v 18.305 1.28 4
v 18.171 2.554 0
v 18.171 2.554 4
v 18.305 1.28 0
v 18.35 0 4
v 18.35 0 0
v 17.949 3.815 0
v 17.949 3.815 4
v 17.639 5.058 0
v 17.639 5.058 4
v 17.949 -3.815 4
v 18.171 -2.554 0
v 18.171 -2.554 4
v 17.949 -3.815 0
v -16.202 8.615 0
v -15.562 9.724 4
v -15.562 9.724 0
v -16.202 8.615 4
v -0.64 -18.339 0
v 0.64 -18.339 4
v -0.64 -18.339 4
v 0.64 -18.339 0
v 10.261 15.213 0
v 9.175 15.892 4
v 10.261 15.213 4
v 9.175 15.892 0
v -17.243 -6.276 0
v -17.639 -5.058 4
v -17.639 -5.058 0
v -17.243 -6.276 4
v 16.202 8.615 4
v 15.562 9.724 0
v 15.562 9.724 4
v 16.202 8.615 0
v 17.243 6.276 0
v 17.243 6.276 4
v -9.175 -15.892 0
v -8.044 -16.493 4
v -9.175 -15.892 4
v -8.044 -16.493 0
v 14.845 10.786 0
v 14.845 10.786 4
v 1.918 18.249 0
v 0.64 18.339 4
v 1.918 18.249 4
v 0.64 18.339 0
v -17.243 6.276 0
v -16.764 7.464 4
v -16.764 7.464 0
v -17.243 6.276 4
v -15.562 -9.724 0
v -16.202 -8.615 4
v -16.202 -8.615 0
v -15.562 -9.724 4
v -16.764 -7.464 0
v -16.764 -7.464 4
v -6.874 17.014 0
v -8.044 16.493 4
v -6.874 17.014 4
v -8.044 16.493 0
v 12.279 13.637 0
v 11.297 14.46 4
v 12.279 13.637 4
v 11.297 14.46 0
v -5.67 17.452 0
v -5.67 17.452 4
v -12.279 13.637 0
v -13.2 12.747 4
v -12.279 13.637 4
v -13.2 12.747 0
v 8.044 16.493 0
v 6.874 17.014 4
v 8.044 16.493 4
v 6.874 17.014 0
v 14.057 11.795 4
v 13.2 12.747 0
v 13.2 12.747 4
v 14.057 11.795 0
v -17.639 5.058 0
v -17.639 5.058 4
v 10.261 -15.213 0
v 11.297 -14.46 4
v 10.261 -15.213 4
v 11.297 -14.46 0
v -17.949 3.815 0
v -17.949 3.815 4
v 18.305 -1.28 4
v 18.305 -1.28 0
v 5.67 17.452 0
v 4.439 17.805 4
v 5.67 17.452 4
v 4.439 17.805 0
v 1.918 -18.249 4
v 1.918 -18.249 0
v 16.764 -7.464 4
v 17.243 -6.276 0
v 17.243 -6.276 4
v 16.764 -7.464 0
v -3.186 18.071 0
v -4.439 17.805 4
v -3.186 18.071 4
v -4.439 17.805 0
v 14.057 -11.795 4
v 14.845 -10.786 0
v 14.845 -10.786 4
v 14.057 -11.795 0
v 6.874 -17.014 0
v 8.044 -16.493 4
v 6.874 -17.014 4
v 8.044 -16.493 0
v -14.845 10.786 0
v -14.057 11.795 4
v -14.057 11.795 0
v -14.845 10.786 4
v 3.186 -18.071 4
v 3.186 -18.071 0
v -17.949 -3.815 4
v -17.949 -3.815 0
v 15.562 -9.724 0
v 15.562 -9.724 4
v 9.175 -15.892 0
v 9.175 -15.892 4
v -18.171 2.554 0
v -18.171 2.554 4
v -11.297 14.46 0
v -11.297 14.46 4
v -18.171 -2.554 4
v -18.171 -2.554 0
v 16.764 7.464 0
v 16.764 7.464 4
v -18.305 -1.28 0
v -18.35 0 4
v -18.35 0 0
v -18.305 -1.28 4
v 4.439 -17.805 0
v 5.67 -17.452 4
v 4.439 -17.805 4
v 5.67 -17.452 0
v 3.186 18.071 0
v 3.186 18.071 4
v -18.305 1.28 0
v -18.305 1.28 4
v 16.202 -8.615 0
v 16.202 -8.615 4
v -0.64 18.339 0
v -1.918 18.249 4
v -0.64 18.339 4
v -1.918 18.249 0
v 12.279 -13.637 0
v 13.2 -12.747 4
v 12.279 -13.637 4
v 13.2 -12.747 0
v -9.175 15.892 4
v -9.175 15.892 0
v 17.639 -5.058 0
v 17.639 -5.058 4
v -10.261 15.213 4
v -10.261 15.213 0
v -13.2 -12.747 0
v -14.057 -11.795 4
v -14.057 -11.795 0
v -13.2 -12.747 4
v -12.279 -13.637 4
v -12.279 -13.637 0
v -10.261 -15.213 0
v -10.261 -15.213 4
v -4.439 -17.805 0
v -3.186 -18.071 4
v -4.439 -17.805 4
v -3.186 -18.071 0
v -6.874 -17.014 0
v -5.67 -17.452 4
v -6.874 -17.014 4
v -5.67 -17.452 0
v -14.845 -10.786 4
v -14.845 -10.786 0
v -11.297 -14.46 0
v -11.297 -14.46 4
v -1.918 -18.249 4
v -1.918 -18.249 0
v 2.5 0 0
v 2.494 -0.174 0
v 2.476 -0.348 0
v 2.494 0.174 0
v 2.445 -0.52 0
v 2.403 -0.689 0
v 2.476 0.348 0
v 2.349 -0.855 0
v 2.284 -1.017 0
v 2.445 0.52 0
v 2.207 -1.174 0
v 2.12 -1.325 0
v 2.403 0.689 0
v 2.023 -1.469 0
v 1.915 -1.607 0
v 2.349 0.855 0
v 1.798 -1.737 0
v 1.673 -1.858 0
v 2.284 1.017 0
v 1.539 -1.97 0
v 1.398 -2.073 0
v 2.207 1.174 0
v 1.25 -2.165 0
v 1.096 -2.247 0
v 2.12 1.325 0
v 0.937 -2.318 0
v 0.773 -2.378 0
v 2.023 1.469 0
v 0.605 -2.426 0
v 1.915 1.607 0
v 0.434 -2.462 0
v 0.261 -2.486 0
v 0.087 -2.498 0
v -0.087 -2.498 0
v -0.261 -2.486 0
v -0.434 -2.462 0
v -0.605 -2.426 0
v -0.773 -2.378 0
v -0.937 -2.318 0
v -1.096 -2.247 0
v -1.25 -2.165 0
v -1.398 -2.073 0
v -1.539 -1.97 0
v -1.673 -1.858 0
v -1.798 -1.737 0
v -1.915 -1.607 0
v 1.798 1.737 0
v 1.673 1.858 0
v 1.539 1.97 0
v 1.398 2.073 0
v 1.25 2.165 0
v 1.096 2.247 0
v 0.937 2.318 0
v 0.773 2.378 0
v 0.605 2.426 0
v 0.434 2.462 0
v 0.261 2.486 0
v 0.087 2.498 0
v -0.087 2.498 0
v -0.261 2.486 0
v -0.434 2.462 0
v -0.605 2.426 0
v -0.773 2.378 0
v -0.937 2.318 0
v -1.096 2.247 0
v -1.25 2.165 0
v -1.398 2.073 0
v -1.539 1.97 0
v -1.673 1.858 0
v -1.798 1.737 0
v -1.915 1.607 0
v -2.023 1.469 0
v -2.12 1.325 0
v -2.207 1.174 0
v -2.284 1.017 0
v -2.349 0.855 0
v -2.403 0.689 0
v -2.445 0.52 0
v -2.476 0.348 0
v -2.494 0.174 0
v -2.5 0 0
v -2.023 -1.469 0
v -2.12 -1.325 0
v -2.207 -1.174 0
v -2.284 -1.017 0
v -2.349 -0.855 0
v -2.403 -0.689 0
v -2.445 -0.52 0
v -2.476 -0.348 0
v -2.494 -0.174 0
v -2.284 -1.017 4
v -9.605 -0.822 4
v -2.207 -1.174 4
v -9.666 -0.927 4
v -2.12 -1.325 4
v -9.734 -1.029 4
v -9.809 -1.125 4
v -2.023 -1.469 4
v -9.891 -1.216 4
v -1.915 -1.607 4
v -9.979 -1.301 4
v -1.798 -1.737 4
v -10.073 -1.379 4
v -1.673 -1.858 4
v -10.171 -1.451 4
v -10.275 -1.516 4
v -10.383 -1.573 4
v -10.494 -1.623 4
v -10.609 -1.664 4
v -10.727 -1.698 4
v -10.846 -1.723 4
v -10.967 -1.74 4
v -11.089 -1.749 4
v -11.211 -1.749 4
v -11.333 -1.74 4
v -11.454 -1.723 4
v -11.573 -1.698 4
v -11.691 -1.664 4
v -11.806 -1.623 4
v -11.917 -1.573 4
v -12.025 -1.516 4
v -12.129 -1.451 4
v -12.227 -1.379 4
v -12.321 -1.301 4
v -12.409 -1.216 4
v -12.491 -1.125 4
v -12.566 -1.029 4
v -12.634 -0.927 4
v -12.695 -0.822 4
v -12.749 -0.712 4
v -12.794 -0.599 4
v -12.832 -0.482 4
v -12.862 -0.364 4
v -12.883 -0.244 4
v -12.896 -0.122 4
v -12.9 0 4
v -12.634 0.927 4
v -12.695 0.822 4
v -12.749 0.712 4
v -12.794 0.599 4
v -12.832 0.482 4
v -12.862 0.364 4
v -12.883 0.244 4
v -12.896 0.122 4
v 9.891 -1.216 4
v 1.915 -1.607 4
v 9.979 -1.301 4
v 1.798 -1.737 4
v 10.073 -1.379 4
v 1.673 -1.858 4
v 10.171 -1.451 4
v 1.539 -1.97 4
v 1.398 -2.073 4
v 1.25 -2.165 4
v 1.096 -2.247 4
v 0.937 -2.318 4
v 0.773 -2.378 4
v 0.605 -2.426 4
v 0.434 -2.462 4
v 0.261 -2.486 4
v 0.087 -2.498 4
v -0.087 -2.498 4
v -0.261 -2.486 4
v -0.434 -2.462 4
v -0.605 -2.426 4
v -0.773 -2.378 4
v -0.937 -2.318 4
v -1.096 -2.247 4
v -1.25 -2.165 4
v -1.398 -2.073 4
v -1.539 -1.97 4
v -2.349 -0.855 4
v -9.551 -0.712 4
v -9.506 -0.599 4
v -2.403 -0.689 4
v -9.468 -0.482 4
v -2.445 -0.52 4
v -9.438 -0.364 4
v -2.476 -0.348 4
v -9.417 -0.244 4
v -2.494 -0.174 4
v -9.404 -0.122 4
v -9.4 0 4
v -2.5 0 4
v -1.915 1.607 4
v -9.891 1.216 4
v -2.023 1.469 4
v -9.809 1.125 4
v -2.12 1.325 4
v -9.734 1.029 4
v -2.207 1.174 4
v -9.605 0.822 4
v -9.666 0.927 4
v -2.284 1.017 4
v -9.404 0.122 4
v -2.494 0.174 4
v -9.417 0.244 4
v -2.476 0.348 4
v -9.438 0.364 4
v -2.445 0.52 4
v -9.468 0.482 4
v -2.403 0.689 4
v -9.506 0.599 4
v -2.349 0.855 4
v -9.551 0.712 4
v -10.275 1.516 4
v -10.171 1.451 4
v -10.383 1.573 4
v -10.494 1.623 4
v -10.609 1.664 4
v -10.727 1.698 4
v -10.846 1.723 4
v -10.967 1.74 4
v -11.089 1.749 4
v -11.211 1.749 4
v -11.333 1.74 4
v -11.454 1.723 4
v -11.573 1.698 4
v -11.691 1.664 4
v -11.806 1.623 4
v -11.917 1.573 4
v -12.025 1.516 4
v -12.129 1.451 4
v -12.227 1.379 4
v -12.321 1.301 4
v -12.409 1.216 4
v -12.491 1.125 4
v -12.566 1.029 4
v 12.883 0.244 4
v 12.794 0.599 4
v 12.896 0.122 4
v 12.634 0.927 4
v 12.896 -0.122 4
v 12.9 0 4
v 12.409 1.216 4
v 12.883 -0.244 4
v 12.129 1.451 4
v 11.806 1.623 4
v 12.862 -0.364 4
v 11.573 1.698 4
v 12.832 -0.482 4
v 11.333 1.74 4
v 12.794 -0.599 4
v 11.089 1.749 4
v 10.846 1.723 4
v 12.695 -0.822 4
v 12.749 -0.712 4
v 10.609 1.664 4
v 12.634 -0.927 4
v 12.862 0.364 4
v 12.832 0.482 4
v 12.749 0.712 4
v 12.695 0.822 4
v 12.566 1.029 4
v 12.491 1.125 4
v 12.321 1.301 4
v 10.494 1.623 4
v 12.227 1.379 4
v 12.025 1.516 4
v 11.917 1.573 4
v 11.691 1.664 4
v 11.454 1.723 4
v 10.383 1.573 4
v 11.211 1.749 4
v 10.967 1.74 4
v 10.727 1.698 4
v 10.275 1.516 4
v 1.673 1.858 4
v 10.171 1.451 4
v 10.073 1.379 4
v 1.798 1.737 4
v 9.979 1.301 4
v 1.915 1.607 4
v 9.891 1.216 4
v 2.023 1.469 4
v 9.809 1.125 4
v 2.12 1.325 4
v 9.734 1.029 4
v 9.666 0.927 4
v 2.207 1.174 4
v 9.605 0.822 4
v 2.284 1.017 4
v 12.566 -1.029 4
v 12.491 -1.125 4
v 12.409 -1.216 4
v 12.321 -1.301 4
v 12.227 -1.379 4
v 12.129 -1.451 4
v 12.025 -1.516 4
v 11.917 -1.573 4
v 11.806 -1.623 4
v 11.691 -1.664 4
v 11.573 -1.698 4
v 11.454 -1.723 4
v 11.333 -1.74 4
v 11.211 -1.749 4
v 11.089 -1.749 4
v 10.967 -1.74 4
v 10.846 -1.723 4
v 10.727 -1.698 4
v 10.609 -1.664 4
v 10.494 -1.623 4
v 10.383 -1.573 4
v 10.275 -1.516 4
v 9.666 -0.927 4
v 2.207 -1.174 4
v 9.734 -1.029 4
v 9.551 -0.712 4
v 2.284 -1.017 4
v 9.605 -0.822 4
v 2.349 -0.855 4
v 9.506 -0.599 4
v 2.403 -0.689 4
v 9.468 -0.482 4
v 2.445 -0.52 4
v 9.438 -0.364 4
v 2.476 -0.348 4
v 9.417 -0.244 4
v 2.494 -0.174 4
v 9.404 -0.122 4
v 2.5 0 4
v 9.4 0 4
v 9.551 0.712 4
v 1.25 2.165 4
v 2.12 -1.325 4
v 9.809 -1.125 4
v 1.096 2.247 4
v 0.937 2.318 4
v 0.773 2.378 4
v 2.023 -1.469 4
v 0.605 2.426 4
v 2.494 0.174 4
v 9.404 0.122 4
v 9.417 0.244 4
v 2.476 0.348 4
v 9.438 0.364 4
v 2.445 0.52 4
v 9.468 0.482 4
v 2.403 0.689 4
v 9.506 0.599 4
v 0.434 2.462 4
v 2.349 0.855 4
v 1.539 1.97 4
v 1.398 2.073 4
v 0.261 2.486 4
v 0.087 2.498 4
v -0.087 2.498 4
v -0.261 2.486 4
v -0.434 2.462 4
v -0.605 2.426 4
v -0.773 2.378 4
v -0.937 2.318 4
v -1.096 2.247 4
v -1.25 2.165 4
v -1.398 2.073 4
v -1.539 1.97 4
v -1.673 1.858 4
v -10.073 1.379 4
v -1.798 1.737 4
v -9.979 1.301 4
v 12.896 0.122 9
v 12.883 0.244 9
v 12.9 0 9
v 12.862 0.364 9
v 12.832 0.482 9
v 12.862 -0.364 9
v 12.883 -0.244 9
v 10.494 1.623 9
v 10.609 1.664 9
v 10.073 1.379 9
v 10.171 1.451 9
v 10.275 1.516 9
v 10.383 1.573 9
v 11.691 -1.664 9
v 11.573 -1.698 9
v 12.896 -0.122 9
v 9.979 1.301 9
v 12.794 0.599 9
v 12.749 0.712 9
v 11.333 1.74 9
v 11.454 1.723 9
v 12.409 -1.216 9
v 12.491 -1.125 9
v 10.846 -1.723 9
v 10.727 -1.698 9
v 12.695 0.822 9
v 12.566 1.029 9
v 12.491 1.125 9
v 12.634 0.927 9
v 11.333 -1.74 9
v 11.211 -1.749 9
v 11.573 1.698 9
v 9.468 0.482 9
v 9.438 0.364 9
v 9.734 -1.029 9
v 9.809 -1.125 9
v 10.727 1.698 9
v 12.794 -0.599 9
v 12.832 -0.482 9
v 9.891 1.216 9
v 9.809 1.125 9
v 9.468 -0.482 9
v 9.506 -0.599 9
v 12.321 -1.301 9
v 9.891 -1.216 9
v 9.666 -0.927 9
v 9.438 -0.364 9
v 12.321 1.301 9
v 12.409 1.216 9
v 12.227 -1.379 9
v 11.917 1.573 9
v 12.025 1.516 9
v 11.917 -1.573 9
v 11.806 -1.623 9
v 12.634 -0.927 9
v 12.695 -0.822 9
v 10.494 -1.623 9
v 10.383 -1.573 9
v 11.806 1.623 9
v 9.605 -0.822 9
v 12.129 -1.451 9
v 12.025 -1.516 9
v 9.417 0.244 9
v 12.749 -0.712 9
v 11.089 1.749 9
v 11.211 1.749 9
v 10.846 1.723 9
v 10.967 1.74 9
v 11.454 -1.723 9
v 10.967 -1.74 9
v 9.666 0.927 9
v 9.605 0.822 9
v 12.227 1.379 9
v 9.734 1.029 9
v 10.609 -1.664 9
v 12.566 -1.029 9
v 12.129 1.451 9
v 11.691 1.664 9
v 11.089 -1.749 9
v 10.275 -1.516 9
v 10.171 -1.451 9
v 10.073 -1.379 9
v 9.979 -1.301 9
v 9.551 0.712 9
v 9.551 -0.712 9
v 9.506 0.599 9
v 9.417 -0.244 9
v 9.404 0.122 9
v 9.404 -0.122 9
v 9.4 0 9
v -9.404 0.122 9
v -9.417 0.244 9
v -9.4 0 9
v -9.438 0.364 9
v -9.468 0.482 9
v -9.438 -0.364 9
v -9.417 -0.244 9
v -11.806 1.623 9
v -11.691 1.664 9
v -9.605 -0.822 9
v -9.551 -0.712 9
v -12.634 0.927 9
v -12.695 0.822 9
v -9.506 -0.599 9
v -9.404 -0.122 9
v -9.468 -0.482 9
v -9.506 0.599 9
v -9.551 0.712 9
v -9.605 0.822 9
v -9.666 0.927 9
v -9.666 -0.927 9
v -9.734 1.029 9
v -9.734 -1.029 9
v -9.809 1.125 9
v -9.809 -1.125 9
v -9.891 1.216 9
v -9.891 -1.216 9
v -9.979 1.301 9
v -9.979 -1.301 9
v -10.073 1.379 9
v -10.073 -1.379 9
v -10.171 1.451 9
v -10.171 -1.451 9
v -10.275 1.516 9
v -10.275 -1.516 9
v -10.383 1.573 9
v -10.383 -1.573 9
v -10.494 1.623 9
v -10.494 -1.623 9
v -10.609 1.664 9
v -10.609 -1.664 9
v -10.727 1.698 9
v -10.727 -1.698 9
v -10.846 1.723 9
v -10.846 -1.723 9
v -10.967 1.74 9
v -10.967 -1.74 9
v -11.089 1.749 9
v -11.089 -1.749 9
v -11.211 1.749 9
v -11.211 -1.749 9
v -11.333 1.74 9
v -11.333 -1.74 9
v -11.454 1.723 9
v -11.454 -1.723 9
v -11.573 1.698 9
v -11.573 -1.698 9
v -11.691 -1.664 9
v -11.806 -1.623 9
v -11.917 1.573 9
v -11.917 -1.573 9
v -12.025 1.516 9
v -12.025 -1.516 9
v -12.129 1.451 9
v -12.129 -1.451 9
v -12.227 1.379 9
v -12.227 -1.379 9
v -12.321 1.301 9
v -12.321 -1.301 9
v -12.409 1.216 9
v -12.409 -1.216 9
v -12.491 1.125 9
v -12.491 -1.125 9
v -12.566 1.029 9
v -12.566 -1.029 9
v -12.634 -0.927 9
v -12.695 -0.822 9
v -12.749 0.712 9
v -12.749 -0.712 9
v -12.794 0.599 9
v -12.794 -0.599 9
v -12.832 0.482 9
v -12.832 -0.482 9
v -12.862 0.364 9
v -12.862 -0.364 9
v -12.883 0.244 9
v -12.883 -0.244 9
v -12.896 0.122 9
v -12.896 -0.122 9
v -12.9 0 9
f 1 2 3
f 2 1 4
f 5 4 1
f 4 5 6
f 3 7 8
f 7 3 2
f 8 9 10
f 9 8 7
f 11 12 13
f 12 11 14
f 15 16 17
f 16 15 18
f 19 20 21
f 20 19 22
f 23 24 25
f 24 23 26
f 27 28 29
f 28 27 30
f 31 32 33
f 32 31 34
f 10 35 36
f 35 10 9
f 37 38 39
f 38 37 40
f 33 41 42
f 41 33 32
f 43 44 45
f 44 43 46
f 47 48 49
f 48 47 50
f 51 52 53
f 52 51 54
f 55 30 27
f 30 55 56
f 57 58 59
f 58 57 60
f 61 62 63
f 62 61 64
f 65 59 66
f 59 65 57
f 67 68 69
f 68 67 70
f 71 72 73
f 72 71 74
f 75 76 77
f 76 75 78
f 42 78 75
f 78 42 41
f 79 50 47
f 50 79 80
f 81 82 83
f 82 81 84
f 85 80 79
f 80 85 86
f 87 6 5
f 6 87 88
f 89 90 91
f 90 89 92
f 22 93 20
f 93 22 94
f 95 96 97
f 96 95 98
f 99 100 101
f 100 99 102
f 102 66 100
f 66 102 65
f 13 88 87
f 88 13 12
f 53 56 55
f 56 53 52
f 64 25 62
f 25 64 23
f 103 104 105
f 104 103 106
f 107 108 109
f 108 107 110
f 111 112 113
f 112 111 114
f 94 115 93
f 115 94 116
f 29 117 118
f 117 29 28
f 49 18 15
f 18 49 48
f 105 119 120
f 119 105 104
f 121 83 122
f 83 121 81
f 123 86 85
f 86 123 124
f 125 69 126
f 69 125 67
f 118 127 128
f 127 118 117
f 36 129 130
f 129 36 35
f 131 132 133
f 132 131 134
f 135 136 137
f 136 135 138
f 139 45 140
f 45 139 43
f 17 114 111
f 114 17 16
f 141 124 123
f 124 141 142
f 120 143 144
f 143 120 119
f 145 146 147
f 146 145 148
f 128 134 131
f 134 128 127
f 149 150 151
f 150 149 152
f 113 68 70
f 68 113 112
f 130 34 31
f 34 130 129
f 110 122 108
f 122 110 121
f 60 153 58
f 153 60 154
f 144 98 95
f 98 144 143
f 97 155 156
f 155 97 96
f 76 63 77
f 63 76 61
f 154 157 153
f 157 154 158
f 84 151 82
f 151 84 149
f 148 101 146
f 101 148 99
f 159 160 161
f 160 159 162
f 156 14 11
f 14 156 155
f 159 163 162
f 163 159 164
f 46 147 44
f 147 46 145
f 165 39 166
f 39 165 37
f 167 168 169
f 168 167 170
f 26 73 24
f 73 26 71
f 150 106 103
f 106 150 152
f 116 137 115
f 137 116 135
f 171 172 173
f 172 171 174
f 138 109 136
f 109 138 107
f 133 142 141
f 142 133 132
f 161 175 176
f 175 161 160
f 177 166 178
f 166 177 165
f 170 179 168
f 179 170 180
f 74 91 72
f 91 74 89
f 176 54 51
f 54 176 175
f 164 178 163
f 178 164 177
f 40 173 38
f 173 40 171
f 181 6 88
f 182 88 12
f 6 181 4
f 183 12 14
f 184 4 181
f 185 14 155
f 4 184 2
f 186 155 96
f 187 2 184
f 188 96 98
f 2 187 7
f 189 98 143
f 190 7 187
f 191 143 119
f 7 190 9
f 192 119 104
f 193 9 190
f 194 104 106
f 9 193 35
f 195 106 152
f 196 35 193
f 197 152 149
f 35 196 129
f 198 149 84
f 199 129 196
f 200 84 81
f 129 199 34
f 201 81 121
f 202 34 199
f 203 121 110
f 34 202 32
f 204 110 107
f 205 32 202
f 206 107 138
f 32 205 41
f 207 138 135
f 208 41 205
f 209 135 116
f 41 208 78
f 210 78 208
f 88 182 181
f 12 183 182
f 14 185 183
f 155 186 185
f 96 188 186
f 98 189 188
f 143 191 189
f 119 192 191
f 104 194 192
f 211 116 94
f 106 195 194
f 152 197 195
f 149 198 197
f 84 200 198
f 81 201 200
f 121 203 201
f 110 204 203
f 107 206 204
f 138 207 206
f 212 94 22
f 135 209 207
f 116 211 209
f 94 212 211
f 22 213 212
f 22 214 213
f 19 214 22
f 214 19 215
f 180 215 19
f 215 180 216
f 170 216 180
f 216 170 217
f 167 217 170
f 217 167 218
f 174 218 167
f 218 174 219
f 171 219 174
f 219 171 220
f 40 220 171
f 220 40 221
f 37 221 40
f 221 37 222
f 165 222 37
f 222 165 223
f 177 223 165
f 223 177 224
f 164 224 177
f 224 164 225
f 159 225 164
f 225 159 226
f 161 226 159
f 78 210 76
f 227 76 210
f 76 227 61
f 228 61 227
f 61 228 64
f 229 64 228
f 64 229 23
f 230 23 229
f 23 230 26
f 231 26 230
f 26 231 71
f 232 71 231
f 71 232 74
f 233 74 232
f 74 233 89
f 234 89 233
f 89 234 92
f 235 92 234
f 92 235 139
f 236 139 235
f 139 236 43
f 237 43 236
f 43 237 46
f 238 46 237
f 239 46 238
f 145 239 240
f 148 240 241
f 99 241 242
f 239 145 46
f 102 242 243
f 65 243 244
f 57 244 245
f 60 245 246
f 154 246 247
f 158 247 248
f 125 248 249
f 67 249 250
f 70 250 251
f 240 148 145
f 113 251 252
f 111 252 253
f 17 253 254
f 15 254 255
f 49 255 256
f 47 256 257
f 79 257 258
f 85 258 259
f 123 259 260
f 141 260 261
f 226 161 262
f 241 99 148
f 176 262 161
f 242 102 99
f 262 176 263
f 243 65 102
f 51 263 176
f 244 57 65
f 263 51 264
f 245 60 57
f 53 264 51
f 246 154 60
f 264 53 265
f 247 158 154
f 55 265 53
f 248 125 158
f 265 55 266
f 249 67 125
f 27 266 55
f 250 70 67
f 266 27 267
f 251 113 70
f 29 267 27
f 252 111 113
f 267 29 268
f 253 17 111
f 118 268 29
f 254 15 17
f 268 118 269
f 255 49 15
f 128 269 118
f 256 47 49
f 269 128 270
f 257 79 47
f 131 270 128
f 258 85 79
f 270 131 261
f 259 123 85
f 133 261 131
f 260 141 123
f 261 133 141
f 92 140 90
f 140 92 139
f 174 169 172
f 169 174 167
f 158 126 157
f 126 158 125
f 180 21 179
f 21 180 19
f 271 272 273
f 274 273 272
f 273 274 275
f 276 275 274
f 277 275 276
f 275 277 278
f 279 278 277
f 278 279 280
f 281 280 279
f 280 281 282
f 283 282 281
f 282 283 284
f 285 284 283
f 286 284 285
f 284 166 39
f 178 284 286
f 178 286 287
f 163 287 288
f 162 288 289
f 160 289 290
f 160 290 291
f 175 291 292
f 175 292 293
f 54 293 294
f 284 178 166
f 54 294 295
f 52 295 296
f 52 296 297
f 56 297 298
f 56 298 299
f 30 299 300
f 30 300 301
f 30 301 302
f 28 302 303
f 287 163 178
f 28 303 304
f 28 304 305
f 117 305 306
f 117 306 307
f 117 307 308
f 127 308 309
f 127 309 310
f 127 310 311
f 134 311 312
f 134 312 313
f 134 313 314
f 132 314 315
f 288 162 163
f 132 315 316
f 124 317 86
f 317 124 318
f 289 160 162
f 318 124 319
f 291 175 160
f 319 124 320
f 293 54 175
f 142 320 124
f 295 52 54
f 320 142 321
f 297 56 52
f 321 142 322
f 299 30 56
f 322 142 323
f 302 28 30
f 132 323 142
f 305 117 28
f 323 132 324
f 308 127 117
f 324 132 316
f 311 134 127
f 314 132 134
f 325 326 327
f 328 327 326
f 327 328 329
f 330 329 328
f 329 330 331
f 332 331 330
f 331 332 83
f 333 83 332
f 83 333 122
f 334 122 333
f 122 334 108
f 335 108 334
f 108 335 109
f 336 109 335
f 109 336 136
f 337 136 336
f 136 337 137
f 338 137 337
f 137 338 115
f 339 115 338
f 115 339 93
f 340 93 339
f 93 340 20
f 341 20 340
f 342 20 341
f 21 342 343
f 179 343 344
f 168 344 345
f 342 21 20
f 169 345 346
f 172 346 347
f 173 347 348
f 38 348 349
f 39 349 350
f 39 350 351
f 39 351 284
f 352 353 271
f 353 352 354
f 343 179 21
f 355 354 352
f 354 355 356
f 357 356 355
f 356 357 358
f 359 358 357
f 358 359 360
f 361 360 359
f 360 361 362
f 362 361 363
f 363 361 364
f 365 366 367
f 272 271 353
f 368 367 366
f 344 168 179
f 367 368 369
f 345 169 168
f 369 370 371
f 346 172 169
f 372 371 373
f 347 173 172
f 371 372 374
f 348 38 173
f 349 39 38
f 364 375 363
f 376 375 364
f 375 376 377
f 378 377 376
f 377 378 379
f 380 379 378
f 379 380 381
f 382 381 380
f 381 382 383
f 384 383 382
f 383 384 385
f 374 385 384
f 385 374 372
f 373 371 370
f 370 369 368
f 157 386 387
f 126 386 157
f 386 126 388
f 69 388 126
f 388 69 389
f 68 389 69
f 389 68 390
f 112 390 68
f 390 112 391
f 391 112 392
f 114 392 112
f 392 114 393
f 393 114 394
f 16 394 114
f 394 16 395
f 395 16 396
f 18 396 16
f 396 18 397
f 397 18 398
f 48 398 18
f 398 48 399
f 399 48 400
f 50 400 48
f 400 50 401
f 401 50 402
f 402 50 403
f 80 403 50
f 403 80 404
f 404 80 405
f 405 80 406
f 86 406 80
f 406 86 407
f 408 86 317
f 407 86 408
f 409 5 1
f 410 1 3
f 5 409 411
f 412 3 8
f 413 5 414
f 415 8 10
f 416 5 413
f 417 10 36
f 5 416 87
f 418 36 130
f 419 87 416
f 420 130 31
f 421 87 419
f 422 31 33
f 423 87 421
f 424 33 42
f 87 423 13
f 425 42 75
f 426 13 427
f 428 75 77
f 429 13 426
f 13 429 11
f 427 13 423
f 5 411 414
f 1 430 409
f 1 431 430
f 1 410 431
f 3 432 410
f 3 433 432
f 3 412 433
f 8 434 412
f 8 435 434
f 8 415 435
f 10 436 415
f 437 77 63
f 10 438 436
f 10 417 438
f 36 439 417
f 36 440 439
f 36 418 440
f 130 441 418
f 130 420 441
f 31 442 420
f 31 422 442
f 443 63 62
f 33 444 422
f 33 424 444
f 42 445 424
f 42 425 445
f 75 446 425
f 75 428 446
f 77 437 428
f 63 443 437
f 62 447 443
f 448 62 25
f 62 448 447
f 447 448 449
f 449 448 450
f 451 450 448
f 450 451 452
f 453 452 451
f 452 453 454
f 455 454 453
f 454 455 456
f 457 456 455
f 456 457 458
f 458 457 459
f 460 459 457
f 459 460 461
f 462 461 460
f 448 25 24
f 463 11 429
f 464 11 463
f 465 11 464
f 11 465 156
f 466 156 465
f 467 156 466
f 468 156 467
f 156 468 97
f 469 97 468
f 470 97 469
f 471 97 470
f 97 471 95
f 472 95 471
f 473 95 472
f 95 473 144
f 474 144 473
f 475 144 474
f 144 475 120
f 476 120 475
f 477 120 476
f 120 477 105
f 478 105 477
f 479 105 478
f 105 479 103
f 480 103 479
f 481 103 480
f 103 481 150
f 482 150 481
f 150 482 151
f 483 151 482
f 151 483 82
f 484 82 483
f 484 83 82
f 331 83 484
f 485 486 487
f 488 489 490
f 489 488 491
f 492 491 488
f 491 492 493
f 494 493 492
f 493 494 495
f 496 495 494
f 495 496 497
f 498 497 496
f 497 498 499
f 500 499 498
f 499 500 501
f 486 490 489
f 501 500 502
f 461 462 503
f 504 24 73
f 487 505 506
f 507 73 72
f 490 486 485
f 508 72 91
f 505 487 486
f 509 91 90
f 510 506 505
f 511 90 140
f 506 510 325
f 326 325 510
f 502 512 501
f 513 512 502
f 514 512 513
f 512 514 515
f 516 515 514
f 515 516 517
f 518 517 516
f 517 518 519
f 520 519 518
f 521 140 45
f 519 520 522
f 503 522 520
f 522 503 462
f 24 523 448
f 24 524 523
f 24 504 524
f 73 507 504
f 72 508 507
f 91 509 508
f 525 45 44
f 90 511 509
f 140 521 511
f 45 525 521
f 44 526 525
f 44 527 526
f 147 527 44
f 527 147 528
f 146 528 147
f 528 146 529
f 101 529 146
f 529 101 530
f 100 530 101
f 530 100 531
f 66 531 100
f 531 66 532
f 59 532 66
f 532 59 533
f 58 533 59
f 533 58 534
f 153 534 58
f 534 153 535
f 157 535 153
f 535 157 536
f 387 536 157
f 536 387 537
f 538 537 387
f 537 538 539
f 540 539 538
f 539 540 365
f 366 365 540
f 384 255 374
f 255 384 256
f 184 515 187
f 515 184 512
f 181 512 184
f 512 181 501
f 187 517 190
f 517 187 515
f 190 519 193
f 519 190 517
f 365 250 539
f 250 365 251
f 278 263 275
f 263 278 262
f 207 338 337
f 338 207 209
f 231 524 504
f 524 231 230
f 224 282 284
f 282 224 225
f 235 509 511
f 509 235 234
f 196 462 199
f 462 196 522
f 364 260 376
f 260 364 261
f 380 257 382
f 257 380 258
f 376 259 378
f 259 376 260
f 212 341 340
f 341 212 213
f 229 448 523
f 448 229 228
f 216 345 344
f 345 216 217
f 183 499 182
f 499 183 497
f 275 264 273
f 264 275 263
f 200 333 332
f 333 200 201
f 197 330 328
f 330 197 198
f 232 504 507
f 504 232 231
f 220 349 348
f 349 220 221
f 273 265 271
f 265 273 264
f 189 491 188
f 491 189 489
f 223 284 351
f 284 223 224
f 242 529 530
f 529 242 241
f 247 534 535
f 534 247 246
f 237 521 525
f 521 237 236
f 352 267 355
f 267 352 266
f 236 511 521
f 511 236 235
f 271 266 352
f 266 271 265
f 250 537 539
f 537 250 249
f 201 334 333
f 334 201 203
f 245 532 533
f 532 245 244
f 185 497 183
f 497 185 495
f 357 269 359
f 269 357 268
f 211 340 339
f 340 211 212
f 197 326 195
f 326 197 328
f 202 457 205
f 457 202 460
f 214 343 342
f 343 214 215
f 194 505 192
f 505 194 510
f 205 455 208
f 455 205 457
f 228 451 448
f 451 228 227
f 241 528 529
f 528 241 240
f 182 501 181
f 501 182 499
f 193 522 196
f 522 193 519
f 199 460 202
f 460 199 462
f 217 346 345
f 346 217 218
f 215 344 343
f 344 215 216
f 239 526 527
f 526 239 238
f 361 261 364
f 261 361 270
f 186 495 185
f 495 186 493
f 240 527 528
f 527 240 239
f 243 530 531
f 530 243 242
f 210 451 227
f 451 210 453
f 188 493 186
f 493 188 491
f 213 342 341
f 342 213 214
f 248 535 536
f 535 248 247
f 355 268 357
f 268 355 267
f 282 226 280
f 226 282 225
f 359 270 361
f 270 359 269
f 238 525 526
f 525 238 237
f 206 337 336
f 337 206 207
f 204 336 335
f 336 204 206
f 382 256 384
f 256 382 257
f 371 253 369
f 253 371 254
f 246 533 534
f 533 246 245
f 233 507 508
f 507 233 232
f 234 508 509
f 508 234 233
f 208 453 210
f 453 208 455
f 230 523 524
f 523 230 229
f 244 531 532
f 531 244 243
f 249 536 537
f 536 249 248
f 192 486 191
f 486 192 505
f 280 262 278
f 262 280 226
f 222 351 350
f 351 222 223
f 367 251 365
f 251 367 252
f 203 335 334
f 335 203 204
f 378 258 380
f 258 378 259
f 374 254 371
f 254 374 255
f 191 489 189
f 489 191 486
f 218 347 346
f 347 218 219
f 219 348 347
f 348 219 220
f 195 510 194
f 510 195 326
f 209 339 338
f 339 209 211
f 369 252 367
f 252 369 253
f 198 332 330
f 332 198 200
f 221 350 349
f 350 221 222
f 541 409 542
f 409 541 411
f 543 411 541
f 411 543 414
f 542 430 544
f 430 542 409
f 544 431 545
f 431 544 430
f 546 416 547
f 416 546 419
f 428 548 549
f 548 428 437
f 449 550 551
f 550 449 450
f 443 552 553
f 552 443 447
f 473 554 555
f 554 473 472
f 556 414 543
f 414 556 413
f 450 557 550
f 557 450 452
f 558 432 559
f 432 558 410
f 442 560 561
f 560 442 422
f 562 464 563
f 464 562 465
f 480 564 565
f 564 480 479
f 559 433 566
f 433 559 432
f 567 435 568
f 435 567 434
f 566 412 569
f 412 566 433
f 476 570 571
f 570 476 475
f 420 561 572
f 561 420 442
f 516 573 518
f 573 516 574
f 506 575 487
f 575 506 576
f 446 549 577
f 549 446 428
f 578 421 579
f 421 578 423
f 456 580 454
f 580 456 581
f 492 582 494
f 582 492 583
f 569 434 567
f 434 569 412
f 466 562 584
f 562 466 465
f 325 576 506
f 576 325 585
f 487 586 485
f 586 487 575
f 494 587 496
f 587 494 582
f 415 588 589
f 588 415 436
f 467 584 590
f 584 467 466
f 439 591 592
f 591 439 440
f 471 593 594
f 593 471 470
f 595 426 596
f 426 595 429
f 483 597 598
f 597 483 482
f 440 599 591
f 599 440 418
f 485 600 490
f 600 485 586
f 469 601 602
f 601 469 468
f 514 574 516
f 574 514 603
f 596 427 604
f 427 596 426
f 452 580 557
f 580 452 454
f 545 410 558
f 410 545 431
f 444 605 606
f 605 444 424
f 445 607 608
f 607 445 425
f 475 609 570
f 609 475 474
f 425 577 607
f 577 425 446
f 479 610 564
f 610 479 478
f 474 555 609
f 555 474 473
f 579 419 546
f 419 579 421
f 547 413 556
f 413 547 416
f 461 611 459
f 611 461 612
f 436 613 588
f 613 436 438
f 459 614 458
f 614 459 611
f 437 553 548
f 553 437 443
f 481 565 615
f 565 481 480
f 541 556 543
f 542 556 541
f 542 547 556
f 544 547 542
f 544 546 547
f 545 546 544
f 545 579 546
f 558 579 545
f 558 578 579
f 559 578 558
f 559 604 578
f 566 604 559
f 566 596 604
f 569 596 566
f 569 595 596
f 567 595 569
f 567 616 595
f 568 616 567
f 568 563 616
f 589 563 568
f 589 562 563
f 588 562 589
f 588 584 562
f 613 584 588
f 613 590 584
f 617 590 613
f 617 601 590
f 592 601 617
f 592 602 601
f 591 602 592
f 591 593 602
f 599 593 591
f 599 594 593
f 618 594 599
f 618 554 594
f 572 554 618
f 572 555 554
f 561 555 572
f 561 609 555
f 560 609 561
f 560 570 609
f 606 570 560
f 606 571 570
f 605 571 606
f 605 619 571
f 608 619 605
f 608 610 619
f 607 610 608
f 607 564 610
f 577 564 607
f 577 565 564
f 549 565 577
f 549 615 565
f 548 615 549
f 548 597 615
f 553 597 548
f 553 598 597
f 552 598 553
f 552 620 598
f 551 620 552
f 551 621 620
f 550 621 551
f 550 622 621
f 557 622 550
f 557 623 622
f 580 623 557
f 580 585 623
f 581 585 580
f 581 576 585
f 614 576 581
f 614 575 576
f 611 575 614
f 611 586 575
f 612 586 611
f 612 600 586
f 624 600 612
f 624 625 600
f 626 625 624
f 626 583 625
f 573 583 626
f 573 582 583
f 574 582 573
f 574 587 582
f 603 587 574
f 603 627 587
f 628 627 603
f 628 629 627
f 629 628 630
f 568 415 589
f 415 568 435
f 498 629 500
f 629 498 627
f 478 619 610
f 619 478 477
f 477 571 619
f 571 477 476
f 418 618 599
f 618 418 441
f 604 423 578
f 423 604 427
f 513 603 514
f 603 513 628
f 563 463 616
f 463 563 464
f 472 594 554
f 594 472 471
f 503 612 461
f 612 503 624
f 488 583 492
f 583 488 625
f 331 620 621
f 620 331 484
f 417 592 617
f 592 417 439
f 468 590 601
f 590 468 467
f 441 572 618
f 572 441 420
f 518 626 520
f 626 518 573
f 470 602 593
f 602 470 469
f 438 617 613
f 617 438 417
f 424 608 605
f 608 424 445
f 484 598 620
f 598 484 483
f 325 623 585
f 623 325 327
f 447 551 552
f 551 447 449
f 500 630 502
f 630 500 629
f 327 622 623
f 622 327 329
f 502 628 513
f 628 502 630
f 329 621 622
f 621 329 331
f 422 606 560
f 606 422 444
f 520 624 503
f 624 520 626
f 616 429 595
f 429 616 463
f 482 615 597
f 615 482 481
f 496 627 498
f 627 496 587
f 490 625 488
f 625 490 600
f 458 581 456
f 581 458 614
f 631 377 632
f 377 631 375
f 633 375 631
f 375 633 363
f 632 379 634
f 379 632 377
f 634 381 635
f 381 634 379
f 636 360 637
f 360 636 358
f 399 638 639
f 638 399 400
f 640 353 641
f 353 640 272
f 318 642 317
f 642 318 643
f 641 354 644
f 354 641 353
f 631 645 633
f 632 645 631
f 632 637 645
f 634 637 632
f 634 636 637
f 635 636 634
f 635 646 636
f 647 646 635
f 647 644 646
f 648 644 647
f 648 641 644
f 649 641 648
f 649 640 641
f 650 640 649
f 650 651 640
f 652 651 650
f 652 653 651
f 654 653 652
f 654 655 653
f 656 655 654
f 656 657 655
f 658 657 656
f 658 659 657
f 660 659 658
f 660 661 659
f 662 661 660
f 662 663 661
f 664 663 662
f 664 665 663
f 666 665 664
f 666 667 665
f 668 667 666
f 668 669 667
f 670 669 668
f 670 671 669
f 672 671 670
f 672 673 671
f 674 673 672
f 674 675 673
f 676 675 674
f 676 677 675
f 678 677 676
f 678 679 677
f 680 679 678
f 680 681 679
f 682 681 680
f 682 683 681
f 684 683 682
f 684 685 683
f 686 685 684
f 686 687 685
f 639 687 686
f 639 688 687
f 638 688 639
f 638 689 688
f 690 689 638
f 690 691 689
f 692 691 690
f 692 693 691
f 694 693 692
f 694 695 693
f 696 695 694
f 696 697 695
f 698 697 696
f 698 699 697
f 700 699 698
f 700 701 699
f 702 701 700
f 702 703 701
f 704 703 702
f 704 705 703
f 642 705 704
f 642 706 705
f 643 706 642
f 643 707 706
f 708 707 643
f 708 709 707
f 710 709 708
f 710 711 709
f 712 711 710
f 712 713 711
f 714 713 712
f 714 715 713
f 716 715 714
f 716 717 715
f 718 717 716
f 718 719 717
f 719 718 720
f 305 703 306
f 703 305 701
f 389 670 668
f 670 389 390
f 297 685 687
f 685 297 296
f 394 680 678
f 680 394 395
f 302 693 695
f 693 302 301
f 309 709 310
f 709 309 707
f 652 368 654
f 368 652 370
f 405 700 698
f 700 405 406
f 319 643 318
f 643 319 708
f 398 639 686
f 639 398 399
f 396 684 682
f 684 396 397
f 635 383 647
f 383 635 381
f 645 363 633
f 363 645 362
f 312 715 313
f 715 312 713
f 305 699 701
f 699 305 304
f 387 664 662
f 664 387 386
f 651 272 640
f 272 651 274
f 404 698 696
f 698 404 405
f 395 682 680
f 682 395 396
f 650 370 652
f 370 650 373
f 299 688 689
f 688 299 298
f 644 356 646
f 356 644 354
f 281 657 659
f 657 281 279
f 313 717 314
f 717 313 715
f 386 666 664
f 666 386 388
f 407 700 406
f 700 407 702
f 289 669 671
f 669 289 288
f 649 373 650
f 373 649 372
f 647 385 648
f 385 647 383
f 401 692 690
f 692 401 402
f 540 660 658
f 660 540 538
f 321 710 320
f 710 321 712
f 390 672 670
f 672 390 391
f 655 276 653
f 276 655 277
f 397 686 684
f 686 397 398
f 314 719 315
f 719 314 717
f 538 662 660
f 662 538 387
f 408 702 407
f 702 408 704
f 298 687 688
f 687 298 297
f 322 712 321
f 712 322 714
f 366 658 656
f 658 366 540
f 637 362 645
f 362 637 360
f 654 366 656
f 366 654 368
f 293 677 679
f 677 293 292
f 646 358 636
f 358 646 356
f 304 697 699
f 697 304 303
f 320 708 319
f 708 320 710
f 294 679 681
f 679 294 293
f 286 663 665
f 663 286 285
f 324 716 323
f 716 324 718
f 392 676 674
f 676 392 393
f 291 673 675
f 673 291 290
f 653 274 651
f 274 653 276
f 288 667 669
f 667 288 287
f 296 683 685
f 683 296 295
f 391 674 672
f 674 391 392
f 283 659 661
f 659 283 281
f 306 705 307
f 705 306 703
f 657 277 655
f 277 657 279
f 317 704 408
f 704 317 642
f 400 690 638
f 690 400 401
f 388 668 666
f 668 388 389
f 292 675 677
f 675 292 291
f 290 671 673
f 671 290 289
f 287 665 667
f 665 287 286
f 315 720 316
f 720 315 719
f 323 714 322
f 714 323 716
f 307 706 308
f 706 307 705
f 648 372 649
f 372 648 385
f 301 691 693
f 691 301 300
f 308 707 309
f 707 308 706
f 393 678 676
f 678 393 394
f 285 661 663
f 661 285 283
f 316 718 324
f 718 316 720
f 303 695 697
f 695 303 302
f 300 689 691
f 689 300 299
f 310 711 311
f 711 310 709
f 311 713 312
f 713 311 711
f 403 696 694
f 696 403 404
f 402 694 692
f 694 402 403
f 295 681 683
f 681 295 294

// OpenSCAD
// file: spindle.scad
// spindle.scad - thumbturn spindle on main Switchbot Lock unit
// Andrew Ho <andrew@zeuscat.com>

// Measured dimensions
spindle_diameter      = 36.7;   // OD of outermost (closest to lock) plate
spindle_height        =  4.0;   // Height/thickness of outermost plate
spindle_hole_diameter =  5.0;   // ID of center hole where thumbturn snaps into
spindle_post_diameter =  3.5;   // OD of post protrusions stabilizing thumbturn
spindle_post_height   =  5;     // Very approximate post height

// Approximately measured distance between inner/outer edges of posts
spindle_post_inner_distance = 22.3;  // 22.1 according to outer distance
spindle_post_outer_distance = 29.1;  // 29.3 according to inner distance

// Rendering parameters
$fn = 90;
e = 0.1;
e2 = e * 2;

module spindle() {
  module post() {
    cylinder(d = spindle_post_diameter, h = spindle_post_height);
  }
  difference() {
    cylinder(d = spindle_diameter, h = spindle_height);
    translate([0, 0, -e]) cylinder(d = spindle_hole_diameter, h = spindle_height + e2);
  }
  translate([0, 0, spindle_height]) {
    translate([ spindle_post_inner_distance / 2, 0, 0]) post();
    translate([-spindle_post_inner_distance / 2, 0, 0]) post();
  }
}

spindle();
// file: thumbturn.scad
// thumbturn.scad - thumbturn on Marvin door lockset
// Andrew Ho <andrew@zeuscat.com>
//
// Lockset surface on door is origin x-y plane, up is either x-axis direction.

// TODO: model handleset plate separately (just recording measured values here)
handleset_width = 196.85;  // Overall side to side width without radius
handleset_top_to_thumbturn_bottom = 282.90;

thumbturn_shaft_diameter = 18.6;   // Diameter of central shaft
thumbturn_shaft_height   = 25.75;  // Outer plane of thumbturn to lockset plate
thumbturn_length         = 50.0;   // Overall top to bottom length
thumbturn_wing_length    = 16.25;  // Very approximate individual wing (unused)
thumbturn_wing_width     =  6.0;   // Thickness of individual thumb wings
thumbturn_height         = 17.25;  // Outer plane of thumbturn to back of wing

// TODO: measure set screw location more precisely
thumbturn_set_screw_diameter   =  6.5;  // Protrusion coming out of shaft side
thumbturn_set_screw_depth      = 12;    // Approximately how far down shaft
thumbturn_set_screw_protrusion =  1;    // Very approximate protrusion height

module thumbturn() {
  // Shaft (TODO: round edges)
  cylinder(d = thumbturn_shaft_diameter, h = thumbturn_shaft_height, $fn = 90);

  // Thumbturn wings (TODO: round edges)
  translate([-thumbturn_length / 2, -thumbturn_wing_width / 2,
             thumbturn_shaft_height - thumbturn_height]) {
    cube([thumbturn_length, thumbturn_wing_width, thumbturn_height]);
  }

  // TODO: render set screw
}
// main file
// adapter.scad - adapter to mate SwitchBot Lock with Marvin deadbolt thumbturn
// Andrew Ho <andrew@zeuscat.com>
//
// Origin x-y plane faces door, up is either x-axis direction.

include <thumbturn.scad>
include <spindle.scad>

adapter_post_hole_height = spindle_post_diameter * (3 / 2);
adapter_base_thickness = 2 + adapter_post_hole_height;
adapter_height = thumbturn_height + adapter_base_thickness;

adapter_slop = 0.5;
adapter_inner_radius = (thumbturn_shaft_diameter / 2) + adapter_slop;
adapter_inner_width = thumbturn_wing_width + (2 * adapter_slop);

adapter_peg_base_radius = (thumbturn_shaft_diameter / 2) - 2;
adapter_peg_base_height = adapter_base_thickness / 2;
adapter_peg_shaft_diameter = spindle_post_diameter - e2;
adapter_peg_ball_diameter = spindle_post_diameter + 0.25;
adapter_peg_shaft_length = 6;  // TODO: measure

e = 0.1;
e2 = e * 2;

module adapter() {
  module post_hole() {
    // Conical hat so hole can print without supports
    cylinder(d1 = 0, d2 = spindle_post_diameter, h = spindle_post_diameter / 2);
    translate([0, 0, spindle_post_diameter / 2]) {
      cylinder(d = spindle_post_diameter, h = spindle_post_height + e);
    }
  }

  bracket_hole_height = spindle_bracket_height + (spindle_bracket_width / 2);
  module bracket_hole_right() {
    translate([0, -spindle_bracket_depth / 2, 0]) {
      hull() {
        // Ridgeline that forms a 45° roof so hole can print without supports
        translate([(spindle_bracket_width - 0.1) / 2, 0, 0]) {
          cube([0.1, spindle_bracket_depth, 0.1]);
        }
        translate([0, 0, spindle_bracket_width / 2]) {
          cube([spindle_bracket_width, spindle_bracket_depth,
                spindle_bracket_height + e]);
        }
      }
    }
  }
  module bracket_hole_left() {
    mirror([1, 0, 0]) bracket_hole_right();
  }

  difference() {
    cylinder(d = spindle_diameter, h = adapter_height, $fn = 90);

    // Cut out thumbturn
    translate([0, 0, -e]) {
      cylinder(r = adapter_inner_radius, h = thumbturn_height + e, $fn = 90);
      translate([0, 0, thumbturn_height / 2]) {
        cube([spindle_diameter + e2, adapter_inner_width, thumbturn_height + e],
             center = true);
      }
    }

    // Cut out holes for spindle posts
    translate([0, 0, adapter_height - adapter_post_hole_height]) {
      translate([ spindle_post_inner_width / 2, 0, 0]) post_hole();
      translate([-spindle_post_inner_width / 2, 0, 0]) post_hole();
    }

    // Cut out holes for brackets
    translate([0, 0, adapter_height - bracket_hole_height]) {
      translate([-spindle_bracket_x, -spindle_bracket_y]) bracket_hole_left();
      translate([-spindle_bracket_x,  spindle_bracket_y]) bracket_hole_left();
      translate([ spindle_bracket_x,  spindle_bracket_y]) bracket_hole_right();
      translate([ spindle_bracket_x, -spindle_bracket_y]) bracket_hole_right();
    }

    // Cut out hole for separate peg assembly
    translate([0, 0, thumbturn_height - e]) {
      cylinder(r = adapter_peg_base_radius, h = adapter_peg_base_height + e);
      cylinder(d = adapter_peg_ball_diameter, h = adapter_base_thickness + e2);
    }
  }
}

module adapter_peg() {
  cylinder(r = adapter_peg_base_radius - e, h = adapter_peg_base_height);
  cylinder(d = adapter_peg_ball_diameter - e2, h = adapter_base_thickness);
  translate([0, 0, adapter_base_thickness]) {
    cylinder(r = peg_shaft_diameter, h = adapter_peg_shaft_length);
  }
}
